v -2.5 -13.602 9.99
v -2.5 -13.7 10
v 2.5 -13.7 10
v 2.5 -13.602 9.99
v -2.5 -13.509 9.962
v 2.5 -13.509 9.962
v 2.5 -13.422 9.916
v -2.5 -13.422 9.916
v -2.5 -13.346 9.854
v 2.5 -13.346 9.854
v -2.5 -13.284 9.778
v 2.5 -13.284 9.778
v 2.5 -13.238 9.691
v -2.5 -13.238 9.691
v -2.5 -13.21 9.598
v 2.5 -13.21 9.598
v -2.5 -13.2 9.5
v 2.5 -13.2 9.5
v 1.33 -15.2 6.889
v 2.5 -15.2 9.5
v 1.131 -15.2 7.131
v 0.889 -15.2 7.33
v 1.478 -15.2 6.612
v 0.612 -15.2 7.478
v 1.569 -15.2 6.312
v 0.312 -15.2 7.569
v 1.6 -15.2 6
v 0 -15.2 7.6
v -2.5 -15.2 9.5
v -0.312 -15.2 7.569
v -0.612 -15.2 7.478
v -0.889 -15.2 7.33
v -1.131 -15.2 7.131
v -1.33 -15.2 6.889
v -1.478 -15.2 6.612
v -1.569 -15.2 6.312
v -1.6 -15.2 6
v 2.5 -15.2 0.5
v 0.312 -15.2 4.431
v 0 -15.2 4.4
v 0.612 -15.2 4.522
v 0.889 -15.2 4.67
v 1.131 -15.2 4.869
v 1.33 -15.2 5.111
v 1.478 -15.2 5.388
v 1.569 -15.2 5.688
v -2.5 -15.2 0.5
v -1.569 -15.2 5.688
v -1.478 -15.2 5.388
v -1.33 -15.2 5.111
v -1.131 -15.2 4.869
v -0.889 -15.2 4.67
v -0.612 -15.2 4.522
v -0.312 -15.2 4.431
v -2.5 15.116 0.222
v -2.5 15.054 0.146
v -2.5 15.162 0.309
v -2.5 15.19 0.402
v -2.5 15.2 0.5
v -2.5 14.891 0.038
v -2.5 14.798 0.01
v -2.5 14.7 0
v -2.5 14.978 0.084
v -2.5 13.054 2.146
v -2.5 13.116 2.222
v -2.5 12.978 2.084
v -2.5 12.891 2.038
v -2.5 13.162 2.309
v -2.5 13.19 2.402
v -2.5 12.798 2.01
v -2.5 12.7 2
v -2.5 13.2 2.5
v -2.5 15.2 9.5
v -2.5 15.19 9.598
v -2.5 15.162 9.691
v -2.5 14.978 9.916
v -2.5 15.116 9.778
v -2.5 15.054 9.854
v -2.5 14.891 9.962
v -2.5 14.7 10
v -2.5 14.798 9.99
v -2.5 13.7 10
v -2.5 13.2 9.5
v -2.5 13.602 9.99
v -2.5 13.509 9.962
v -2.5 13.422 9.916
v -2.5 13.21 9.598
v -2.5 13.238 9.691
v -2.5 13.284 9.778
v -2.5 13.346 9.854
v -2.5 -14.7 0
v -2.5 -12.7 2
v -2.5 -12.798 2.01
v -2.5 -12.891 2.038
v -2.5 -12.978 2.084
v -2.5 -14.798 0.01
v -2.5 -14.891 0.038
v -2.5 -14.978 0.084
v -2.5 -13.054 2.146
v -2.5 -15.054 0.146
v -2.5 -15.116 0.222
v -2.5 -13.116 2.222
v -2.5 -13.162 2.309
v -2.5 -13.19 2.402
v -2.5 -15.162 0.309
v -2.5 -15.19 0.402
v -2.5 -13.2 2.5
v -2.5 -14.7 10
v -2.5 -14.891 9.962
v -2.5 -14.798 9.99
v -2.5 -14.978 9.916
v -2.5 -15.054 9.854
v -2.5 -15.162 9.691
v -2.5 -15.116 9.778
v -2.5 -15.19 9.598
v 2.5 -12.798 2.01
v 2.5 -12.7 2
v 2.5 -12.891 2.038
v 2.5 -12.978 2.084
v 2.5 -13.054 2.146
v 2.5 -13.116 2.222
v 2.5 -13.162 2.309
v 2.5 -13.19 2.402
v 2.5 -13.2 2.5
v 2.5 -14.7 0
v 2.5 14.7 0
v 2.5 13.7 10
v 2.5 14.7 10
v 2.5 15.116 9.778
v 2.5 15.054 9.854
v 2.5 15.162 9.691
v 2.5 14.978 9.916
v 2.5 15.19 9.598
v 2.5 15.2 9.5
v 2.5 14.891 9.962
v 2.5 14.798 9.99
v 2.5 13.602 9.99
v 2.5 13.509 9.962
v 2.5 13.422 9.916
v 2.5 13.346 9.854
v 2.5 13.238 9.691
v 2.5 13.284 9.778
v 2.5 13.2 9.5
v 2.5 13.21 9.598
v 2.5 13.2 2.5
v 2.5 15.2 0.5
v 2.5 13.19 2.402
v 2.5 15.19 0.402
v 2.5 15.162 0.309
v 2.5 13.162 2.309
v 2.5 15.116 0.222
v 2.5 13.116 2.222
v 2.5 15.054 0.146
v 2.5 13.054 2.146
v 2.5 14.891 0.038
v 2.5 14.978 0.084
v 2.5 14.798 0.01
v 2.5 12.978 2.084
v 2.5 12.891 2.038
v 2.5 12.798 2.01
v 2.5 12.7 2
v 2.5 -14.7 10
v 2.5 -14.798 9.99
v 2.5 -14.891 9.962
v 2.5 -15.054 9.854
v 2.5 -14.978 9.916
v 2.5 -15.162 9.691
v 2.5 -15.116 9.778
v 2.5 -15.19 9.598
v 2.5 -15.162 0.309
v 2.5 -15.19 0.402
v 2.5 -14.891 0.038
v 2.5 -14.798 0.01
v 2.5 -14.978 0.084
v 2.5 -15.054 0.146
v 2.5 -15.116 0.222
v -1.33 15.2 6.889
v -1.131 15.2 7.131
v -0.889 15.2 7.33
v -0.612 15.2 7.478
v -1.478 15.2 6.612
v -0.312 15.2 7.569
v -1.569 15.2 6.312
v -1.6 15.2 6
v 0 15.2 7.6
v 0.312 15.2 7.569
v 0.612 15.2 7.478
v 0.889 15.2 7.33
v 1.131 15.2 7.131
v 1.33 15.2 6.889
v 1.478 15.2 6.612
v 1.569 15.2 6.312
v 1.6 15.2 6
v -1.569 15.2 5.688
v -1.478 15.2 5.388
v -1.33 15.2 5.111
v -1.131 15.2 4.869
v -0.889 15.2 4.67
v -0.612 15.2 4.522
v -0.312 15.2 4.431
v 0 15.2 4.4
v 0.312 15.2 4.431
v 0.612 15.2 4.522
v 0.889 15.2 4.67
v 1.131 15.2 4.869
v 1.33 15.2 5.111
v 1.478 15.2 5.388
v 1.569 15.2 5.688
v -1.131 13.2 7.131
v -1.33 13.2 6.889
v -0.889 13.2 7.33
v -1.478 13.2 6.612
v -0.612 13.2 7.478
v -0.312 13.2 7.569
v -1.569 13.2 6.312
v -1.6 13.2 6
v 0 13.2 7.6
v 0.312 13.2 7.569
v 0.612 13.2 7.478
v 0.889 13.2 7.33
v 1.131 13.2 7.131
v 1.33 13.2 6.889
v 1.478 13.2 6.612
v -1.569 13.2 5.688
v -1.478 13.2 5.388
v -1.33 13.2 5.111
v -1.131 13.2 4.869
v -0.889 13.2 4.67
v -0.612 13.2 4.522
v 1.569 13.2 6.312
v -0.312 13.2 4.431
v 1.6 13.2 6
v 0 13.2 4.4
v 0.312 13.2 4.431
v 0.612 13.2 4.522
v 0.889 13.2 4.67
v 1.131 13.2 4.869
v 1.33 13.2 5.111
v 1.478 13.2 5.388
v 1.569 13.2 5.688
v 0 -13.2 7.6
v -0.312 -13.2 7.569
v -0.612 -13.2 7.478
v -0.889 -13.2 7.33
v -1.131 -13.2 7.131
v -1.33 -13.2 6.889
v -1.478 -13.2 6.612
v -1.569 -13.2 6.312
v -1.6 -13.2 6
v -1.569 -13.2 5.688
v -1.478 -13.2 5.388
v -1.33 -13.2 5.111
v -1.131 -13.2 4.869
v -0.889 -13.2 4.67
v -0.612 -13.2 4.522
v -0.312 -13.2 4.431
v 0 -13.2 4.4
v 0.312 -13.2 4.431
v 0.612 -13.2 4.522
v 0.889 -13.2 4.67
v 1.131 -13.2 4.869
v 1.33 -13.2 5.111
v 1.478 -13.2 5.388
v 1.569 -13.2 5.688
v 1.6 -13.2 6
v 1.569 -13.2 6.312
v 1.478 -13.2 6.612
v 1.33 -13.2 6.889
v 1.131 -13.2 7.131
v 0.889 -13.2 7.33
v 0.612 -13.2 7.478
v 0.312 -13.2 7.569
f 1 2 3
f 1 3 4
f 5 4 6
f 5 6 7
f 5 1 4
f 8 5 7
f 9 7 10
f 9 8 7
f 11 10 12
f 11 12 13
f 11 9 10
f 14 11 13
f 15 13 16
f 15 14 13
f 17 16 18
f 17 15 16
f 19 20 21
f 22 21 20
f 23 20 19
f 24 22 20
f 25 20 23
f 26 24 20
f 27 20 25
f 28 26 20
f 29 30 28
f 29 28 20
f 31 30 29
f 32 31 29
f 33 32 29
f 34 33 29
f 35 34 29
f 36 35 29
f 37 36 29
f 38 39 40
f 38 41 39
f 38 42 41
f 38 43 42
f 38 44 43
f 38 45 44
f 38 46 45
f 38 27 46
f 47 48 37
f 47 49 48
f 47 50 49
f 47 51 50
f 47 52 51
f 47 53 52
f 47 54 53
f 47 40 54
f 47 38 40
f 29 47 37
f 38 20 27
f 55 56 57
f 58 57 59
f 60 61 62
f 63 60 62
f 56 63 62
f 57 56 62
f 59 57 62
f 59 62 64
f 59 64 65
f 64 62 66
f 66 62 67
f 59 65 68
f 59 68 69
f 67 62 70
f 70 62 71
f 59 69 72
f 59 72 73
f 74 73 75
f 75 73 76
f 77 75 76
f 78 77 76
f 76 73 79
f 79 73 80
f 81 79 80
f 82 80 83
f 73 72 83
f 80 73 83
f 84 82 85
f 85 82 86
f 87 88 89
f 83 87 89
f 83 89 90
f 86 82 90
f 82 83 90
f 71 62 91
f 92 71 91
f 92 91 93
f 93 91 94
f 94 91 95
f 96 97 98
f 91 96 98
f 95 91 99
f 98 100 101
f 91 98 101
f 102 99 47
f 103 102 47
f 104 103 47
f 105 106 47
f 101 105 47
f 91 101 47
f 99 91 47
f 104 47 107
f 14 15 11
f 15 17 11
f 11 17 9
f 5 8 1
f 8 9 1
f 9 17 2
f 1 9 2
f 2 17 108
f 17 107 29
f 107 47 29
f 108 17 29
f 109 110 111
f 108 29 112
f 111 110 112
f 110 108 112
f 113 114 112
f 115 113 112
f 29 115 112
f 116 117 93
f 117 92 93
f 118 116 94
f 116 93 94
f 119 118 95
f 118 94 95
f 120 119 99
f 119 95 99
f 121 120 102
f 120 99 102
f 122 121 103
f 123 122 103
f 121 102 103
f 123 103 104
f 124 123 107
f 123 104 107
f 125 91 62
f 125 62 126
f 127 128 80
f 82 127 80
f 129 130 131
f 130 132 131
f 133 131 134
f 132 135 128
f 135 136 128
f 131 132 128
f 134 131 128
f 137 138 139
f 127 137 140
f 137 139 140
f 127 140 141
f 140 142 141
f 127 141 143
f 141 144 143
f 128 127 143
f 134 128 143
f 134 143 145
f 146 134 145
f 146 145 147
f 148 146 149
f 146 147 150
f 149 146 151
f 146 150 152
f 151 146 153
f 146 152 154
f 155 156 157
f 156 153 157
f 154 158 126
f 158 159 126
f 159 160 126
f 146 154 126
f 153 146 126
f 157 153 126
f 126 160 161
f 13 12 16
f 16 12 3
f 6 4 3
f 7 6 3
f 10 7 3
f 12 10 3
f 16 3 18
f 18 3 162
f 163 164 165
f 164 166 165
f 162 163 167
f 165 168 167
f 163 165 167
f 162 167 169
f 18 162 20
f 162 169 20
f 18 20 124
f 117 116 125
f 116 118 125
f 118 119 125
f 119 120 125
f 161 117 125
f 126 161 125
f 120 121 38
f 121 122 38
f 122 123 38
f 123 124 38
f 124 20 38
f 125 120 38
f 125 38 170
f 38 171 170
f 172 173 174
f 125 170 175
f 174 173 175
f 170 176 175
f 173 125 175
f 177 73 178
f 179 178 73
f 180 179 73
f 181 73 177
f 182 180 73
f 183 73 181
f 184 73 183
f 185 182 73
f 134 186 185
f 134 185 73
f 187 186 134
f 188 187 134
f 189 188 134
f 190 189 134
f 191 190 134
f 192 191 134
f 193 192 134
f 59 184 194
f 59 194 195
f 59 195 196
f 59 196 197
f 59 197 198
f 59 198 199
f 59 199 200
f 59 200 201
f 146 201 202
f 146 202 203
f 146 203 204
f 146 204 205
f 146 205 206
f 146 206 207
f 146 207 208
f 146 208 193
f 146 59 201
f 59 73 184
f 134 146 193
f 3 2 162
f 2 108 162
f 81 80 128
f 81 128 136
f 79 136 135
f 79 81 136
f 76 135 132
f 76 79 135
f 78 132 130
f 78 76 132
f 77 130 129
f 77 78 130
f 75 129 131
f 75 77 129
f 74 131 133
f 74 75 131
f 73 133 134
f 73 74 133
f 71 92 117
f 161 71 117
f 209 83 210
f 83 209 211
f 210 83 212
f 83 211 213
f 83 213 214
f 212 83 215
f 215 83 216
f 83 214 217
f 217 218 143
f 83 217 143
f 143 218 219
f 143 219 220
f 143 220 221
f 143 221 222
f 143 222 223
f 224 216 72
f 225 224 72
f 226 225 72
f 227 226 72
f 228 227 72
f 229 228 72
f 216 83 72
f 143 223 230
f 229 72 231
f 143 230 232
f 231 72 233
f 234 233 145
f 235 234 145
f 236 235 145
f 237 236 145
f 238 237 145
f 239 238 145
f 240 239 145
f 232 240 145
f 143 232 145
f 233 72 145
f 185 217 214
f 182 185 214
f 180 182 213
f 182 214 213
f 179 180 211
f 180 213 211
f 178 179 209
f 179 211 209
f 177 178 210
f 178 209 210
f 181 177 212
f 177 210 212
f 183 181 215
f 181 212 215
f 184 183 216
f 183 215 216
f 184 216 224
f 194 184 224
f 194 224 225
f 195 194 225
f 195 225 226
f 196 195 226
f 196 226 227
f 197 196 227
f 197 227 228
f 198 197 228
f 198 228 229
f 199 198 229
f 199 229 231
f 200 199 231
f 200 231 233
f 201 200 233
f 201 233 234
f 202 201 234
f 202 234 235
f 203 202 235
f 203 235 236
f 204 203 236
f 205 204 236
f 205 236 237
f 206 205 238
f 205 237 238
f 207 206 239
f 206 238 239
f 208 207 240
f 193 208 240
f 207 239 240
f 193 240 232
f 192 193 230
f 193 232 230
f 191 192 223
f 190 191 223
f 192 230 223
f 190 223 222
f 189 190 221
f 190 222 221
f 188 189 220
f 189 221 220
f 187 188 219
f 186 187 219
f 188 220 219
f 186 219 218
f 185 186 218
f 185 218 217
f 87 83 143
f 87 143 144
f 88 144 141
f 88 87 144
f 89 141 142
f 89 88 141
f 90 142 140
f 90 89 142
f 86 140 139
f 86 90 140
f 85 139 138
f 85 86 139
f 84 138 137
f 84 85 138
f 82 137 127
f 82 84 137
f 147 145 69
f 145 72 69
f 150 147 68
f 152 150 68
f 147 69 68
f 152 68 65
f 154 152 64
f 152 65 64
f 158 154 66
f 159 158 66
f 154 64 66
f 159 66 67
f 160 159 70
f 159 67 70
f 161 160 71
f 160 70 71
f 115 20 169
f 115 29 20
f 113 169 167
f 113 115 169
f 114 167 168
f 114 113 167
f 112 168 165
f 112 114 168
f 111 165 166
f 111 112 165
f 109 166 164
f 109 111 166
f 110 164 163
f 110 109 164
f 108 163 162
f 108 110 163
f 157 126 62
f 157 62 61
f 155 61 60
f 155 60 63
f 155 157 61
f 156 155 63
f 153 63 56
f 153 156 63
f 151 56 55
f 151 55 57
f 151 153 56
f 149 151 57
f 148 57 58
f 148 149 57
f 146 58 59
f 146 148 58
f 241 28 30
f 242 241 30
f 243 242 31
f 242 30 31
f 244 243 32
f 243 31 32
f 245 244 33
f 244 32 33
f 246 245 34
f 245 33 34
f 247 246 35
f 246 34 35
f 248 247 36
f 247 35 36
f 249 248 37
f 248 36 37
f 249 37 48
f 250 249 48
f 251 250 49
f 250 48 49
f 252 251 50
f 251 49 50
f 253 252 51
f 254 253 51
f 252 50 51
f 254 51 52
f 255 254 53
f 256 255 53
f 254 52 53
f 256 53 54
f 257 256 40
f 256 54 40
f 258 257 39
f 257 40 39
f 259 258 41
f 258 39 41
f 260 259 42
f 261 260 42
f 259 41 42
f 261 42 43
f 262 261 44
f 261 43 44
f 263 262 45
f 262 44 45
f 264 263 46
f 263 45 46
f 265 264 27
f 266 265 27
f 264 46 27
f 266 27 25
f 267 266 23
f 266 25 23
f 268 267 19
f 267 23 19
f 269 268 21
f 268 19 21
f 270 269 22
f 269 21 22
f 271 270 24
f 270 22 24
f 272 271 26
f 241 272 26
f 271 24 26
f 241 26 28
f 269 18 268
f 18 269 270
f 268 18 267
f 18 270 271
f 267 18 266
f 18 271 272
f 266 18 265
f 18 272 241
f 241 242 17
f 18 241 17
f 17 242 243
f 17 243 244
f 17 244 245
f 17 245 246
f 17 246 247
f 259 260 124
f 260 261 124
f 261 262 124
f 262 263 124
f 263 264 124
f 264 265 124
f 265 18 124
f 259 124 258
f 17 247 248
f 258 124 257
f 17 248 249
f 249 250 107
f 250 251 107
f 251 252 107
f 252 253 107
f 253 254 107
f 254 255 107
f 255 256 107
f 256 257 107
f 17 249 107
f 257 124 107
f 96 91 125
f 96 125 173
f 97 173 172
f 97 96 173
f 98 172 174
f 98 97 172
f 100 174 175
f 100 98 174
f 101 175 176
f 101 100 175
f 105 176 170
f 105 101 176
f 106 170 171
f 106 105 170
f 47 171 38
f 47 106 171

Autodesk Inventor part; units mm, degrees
ref_plane "YZ Plane" through (0, 0, 0) normal (1, 0, 0) x (0, 1, 0)
ref_plane "XZ Plane" through (0, 0, 0) normal (0, 1, 0) x (-1, 0, 0)
ref_plane "XY Plane" through (0, 0, 0) normal (0, 0, 1) x (1, 0, 0)
sketch "Sketch1" plane through (0, 0, 0) normal (0, 0, 1) x (1, 0, 0)
  line L0 (-2.5, 15.2) -> (2.5, 15.2)
  line L1 (2.5, 15.2) -> (2.5, -15.2)
  line L2 (2.5, -15.2) -> (-2.5, -15.2)
  line L3 (-2.5, -15.2) -> (-2.5, 15.2)
  point P0 (0, 0)
  point P1 (2.5, 0)
  point P2 (0, 15.2)
  dimension "d0" = 30.4
  dimension "d1" = 5
extrude "Extrusion1" add sketch "Sketch1" along normal blind 2
sketch "Sketch2" plane through (-2.5, 15.2, 0) normal (0, 1, 0) x (1, 0, 0)
  line L0 (5, -2) -> (0, -2) projected
  line L1 (0, -2) -> (5, -2)
  line L2 (5, -2) -> (5, -10)
  line L3 (5, -10) -> (0, -10)
  line L4 (0, -10) -> (0, -2)
  point P0 (2.5, 0)
  dimension "d4" = 5
  dimension "d5" = 8
extrude "Extrusion2" add sketch "Sketch2" against normal blind 2
mirror "Mirror1" about plane through (0, 0, 0) normal (0, 1, 0) of "Extrusion2"
sketch "Sketch3" plane through (-2.5, 15.2, 0) normal (0, 1, 0) x (1, 0, 0)
  line L0 (5, -10) -> (0, -10) projected
  line L1 (5, -2) -> (5, -10) projected
  line L2 (0, -2) -> (5, -2) projected
  line L3 (0, -10) -> (0, -2) projected
  point P0 (2.5, 0)
  point P1 (2.5, -6)
  point P2 (2.5, -2)
  point P3 (0, -6)
hole "Hole1" at (0, 15.2, 6) direction (0, -1, 0) diameter 3.2 depth 30.4 clearance for "Flat Head Machine Screw" size "M3" standard "Ansi Metric M Profile"
fillet "Fillet1" radius 0.5 8 edges at (0, 15.2, 0) (0, -15.2, 0) (0, -15.2, 10) (0, -13.2, 10) (0, -13.2, 2) (0, 13.2, 2) (0, 13.2, 10) (0, 15.2, 10)
properties part number "bobastacksupport" material "Aluminum 6061"
